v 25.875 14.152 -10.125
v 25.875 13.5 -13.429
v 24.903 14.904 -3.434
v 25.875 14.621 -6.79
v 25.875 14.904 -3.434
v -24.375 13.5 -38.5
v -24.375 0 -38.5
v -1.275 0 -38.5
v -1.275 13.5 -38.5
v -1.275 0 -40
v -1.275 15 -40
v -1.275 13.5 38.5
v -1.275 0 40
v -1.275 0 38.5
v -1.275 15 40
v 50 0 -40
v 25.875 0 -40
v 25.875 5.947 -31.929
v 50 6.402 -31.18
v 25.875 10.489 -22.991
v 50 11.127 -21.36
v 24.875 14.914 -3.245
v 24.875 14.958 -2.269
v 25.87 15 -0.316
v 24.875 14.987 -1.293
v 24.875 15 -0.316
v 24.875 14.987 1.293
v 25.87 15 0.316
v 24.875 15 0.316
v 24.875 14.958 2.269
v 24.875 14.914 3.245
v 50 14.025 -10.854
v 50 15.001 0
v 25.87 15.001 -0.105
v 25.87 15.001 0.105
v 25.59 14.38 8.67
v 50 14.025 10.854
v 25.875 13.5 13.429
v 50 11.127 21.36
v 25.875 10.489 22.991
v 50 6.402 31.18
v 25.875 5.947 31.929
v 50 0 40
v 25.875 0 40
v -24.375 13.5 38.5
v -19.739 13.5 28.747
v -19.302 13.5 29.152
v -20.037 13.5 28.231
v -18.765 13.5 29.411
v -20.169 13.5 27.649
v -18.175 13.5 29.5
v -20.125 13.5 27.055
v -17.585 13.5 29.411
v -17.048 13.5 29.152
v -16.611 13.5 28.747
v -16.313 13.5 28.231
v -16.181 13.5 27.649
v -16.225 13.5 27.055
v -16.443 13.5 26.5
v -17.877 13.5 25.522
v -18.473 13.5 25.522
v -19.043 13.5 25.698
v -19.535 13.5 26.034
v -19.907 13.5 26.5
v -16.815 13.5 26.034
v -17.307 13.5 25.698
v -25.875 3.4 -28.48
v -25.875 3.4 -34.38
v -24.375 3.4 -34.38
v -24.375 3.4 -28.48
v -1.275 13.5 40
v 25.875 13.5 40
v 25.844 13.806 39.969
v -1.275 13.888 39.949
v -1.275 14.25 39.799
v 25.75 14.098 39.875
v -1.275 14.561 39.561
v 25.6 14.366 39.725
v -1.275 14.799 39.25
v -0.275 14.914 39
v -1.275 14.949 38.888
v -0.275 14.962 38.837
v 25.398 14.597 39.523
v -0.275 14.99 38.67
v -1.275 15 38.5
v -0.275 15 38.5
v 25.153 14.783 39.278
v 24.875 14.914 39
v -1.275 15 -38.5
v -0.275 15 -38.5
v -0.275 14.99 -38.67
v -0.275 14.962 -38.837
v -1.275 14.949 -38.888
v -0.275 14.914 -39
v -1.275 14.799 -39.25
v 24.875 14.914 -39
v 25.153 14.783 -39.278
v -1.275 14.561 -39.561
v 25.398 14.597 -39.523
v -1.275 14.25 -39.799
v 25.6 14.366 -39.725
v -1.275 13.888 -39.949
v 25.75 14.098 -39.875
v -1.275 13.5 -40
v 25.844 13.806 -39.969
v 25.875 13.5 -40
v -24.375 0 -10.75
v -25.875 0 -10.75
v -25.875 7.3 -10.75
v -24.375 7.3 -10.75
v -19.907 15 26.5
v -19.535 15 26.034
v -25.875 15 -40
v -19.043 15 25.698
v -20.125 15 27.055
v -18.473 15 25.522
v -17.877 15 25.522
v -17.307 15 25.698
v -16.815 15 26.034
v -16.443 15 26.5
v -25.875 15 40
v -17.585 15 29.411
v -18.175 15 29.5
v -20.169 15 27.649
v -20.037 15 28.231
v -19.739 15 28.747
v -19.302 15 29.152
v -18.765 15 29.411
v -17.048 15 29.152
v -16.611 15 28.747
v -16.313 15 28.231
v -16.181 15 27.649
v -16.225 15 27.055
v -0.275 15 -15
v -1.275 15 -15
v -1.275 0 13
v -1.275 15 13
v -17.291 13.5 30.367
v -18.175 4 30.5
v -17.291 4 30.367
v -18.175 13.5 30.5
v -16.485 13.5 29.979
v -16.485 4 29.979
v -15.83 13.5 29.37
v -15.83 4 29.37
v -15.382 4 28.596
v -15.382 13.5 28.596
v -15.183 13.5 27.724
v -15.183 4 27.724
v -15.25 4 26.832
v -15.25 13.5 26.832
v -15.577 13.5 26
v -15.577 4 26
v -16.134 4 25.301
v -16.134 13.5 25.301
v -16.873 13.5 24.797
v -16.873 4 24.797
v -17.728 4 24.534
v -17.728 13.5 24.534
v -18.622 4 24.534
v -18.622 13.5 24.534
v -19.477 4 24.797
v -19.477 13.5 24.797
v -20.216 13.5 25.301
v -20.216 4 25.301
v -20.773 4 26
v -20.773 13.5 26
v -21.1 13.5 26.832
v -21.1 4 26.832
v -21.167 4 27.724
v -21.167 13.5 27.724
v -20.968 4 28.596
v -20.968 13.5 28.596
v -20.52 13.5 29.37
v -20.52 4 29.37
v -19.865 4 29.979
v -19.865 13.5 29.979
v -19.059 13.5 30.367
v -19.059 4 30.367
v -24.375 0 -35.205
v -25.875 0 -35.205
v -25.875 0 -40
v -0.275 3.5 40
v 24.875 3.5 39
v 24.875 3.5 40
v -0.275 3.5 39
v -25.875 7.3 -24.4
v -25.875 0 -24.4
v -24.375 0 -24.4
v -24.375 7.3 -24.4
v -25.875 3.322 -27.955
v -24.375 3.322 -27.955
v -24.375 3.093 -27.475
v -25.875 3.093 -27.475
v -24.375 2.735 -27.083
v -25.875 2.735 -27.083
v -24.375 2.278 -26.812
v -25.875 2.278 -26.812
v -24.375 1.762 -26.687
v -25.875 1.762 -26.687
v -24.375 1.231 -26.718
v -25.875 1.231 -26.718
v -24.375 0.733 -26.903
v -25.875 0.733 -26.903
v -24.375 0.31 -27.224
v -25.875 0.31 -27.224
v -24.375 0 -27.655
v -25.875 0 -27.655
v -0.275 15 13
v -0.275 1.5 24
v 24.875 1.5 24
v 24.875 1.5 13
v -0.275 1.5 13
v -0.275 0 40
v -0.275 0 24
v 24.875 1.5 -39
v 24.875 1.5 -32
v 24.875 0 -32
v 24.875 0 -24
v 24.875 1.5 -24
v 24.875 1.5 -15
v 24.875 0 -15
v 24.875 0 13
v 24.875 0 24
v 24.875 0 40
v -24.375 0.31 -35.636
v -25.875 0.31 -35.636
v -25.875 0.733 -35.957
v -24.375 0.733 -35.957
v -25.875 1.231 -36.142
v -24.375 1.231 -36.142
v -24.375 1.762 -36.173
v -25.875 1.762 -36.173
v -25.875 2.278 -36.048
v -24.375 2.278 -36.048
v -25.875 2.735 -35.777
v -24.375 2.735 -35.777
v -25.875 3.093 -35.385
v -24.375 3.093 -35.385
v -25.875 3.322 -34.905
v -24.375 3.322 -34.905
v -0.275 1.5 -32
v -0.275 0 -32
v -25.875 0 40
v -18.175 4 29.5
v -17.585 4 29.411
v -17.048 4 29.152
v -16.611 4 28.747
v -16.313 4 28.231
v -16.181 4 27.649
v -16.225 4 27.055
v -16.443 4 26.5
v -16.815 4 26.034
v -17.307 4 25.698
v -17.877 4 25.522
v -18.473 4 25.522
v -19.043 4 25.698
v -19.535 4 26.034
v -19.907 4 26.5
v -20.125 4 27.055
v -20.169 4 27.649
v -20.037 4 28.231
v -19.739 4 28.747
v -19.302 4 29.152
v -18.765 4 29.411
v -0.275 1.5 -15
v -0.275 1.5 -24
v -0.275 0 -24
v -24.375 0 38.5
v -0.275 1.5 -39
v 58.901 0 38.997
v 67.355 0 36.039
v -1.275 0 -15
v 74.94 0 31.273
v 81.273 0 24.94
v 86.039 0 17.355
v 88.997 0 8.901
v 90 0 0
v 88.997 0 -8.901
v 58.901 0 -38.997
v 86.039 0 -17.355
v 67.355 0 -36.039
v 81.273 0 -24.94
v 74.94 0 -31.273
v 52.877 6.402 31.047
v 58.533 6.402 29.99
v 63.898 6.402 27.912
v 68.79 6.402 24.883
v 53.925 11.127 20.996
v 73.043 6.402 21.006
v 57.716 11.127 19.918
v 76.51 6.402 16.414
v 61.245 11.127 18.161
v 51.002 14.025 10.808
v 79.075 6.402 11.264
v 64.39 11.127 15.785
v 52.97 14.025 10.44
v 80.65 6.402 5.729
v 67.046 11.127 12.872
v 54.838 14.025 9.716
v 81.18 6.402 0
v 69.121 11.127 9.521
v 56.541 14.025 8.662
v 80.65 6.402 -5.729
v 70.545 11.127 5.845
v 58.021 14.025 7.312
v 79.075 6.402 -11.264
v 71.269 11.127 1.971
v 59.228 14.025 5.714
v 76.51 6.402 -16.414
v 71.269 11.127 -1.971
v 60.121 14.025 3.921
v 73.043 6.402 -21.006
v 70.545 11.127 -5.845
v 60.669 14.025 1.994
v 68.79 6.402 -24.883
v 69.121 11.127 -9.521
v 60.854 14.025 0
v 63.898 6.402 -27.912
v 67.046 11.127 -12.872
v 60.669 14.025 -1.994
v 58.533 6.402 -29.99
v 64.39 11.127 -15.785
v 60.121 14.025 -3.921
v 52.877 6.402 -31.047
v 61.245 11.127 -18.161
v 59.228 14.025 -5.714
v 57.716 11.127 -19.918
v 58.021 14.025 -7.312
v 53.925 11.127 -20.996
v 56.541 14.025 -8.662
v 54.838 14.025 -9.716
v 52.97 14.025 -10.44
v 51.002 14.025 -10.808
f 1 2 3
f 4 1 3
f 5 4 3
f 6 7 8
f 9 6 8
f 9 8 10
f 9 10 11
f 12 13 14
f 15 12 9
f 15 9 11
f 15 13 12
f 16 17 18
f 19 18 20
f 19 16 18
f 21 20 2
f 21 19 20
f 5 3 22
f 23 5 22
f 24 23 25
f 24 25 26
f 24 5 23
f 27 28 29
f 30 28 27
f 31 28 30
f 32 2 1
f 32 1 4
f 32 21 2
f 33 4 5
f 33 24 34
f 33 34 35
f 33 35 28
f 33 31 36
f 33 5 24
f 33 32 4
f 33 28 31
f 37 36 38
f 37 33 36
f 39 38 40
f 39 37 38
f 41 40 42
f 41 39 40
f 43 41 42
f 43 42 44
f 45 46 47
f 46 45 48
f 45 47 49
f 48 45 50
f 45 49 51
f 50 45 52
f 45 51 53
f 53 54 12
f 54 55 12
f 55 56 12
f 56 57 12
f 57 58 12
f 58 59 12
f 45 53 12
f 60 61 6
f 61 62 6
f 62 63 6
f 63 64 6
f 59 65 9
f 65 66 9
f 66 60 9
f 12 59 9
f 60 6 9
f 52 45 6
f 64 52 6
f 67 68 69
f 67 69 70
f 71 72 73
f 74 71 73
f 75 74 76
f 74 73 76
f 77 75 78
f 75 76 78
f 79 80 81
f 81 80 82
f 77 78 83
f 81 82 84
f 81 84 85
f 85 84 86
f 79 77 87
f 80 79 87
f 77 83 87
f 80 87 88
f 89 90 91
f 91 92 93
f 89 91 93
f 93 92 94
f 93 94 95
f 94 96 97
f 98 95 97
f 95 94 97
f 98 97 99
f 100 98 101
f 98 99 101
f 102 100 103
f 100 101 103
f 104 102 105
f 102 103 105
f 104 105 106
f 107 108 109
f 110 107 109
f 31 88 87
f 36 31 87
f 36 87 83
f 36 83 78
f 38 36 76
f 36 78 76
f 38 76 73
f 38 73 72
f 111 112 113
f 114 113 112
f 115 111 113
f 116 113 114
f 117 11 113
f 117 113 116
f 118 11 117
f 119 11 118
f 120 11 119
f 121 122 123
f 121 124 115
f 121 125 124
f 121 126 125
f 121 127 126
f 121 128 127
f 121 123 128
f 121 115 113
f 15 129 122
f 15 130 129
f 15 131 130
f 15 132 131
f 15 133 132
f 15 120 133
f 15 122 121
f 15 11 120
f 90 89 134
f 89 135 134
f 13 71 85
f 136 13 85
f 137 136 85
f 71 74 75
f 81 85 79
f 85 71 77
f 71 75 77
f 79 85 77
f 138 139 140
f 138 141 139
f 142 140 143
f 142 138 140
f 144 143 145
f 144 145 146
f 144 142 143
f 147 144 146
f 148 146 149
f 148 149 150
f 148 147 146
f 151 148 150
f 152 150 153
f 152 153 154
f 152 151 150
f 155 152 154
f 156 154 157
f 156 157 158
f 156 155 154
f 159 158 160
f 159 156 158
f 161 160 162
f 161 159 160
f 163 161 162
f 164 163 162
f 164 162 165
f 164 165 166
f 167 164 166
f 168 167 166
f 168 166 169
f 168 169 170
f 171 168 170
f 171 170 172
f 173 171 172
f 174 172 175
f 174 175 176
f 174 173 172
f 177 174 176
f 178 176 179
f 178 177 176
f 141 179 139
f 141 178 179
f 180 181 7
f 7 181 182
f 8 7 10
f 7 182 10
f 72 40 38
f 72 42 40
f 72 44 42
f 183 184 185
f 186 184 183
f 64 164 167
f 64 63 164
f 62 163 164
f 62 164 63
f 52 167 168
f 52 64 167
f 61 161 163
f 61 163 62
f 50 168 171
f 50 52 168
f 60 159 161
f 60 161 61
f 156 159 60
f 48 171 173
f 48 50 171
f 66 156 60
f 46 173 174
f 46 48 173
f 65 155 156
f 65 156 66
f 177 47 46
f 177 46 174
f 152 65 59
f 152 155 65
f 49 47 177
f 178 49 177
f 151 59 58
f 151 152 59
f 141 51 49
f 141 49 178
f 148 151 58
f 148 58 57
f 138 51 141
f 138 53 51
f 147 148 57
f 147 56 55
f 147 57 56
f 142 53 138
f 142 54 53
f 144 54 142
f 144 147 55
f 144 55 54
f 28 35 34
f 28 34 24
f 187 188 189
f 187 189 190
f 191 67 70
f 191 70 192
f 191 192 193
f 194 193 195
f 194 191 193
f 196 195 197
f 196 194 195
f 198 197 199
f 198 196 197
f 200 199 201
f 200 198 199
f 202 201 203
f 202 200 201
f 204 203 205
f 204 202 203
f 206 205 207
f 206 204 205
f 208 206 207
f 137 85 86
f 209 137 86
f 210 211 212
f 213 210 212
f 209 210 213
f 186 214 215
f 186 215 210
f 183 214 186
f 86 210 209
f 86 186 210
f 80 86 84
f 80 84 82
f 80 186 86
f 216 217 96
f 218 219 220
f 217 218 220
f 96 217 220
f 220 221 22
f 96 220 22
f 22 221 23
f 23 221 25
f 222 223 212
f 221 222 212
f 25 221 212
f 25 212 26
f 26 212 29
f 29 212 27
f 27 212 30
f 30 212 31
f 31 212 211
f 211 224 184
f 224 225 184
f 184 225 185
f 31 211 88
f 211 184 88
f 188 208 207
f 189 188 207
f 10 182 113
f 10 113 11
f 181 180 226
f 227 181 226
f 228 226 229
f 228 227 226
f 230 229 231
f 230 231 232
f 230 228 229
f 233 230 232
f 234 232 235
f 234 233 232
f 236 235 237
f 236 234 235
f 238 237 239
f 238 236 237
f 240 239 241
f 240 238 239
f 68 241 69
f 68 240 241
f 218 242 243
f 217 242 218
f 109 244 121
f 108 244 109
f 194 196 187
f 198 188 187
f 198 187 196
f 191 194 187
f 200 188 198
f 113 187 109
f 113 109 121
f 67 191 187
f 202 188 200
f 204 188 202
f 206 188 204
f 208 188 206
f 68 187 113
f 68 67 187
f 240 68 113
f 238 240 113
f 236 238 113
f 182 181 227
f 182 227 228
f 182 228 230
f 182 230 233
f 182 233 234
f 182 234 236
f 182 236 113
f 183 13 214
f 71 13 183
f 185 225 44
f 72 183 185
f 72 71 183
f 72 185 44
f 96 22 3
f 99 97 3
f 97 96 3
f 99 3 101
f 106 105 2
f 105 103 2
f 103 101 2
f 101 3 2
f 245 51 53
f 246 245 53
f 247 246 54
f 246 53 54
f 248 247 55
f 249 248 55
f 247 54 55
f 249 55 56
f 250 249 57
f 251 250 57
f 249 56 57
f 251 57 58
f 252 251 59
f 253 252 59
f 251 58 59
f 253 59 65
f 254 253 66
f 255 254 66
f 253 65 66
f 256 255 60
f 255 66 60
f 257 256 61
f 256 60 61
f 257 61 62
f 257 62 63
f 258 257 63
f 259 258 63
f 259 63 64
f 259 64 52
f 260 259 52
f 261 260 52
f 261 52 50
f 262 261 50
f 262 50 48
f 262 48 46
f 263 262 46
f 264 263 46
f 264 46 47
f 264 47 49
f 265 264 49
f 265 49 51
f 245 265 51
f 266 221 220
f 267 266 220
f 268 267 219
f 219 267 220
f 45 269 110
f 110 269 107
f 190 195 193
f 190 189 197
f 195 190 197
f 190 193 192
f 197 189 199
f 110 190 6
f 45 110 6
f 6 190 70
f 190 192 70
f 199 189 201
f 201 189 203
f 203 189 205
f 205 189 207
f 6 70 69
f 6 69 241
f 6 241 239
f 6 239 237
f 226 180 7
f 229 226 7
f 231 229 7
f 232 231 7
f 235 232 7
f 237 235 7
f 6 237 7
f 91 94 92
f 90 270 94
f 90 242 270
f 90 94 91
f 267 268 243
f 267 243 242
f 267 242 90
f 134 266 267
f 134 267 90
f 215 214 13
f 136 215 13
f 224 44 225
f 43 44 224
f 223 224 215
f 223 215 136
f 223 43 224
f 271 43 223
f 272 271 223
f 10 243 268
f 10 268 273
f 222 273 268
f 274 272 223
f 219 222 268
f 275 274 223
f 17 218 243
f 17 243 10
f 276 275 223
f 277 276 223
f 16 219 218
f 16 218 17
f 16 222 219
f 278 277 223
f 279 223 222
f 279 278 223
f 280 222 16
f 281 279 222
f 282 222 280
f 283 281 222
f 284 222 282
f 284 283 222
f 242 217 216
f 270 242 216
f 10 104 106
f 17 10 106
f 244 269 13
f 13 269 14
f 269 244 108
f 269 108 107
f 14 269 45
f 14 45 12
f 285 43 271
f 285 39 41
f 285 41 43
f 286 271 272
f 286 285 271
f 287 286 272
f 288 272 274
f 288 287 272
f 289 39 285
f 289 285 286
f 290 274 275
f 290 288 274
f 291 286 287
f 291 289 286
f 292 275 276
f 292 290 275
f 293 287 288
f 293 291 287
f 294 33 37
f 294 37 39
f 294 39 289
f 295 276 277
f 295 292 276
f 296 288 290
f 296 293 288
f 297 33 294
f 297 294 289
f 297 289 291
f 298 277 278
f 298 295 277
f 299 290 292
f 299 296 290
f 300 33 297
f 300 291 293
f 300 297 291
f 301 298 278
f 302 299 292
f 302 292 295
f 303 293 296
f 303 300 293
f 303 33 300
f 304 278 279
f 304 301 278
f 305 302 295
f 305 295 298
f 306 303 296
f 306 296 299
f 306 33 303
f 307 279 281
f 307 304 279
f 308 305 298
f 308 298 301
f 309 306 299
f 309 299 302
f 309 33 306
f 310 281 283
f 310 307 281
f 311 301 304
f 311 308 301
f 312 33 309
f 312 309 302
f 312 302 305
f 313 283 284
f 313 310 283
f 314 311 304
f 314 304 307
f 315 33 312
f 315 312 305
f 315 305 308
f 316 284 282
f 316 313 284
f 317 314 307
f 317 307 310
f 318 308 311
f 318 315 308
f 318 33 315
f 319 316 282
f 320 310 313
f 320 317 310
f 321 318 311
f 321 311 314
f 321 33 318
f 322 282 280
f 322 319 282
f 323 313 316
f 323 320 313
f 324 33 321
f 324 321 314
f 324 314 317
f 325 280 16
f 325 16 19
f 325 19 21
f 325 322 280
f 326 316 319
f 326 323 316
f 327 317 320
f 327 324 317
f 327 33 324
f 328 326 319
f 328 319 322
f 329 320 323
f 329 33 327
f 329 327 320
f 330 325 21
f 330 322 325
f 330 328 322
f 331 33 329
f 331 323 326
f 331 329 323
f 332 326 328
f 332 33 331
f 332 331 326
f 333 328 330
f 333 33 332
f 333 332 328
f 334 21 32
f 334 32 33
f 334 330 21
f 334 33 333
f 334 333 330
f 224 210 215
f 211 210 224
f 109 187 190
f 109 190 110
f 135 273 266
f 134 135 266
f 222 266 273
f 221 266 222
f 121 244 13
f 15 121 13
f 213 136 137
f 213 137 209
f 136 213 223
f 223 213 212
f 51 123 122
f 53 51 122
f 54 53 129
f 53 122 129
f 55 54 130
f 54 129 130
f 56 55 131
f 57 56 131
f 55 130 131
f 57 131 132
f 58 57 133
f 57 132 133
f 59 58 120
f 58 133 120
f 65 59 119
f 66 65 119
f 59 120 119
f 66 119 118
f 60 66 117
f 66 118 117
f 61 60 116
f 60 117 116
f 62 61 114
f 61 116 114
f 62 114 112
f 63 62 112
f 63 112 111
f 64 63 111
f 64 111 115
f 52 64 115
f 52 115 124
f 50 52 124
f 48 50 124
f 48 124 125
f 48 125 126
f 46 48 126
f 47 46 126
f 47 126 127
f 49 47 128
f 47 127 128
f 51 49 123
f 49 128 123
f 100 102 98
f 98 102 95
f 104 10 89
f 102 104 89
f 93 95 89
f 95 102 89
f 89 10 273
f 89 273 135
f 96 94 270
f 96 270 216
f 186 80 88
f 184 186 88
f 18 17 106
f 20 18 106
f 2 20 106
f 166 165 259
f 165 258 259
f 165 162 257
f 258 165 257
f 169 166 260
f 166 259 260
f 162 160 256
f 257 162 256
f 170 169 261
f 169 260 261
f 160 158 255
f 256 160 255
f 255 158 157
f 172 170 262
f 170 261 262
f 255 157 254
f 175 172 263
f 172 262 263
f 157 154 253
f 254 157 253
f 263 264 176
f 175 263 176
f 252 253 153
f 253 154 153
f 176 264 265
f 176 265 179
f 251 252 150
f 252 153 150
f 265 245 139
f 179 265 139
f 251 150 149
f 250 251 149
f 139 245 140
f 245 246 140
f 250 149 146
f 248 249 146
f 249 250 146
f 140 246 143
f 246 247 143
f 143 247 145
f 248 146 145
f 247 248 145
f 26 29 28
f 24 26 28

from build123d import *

# Parameters (mm, degrees)
SKETCH1_W                  = 51.75
SKETCH1_H                  = 80
BOSS_EXTRUDE1_DEPTH        = 15
SHELL3_T                   = -1.5
CUT_EXTRUDE2_DEPTH         = 1.5
SKETCH6_W                  = 13.65
SKETCH6_H                  = 7.3
CUT_EXTRUDE3_DEPTH         = 1.5
SKETCH11_R                 = 2
BOSS_EXTRUDE10_DEPTH       = 11
SKETCH11_3_R               = 2
CUT_EXTRUDE10_DEPTH        = 1.5
SHELL9_T                   = 1
SKETCH47_W                 = 27.15
SKETCH47_H                 = 15
CUT_EXTRUDE15_DEPTH        = 86.407936546
SKETCH47_2_W               = 27.15
SKETCH47_2_H               = 15
BOSS_EXTRUDE12_DEPTH       = 80
SHELL15_T                  = -1
SHELL15_THICKNESS_2_FACE_W = 78
SHELL15_THICKNESS_2_FACE_H = 25.15
SHELL15_THICKNESS_2_DEPTH  = 0.5
SKETCH52_W                 = 25.15
SKETCH52_H                 = 3.5
CUT_EXTRUDE21_DEPTH        = 1
SKETCH54_W                 = 28
SKETCH54_H                 = 15
CUT_EXTRUDE22_DEPTH        = 1
SKETCH55_W                 = 25.15
SKETCH55_H                 = 15
SKETCH55_W_2               = 26.15
SKETCH55_H_2               = 28
SKETCH55_H_3               = 8
CUT_EXTRUDE23_DEPTH        = 1.5
BOSS_EXTRUDE13_DEPTH       = 24.13
REVOLVE5_ANGLE             = 180
FILLET1_R                  = 1.5


with BuildPart() as part:
    # Sketch1 → Boss-Extrude1 (new body)
    with BuildSketch(Plane(origin=(0, 0, 0), x_dir=(1, 0, 0), z_dir=(0, 1, 0))):
        Rectangle(SKETCH1_W, SKETCH1_H)
    extrude(amount=BOSS_EXTRUDE1_DEPTH)

    # Shell3
    shell3_openings = [part.faces().sort_by_distance(p)[0] for p in [
        (0, 0, 0),
    ]]
    offset(amount=SHELL3_T, openings=shell3_openings, kind=Kind.INTERSECTION)

    # Sketch4 → Cut-Extrude2 (cut)
    with BuildSketch(Plane.ZY.offset(25.875)):
        with BuildLine():
            Line((-34.38, 3.4), (-28.48, 3.4))
            ThreePointArc((-28.48, 3.4), (-26.68, 1.6), (-28.48, -0.2))
            Line((-28.48, -0.2), (-34.38, -0.2))
            ThreePointArc((-34.38, -0.2), (-36.18, 1.6), (-34.38, 3.4))
        make_face()
    extrude(amount=-CUT_EXTRUDE2_DEPTH, mode=Mode.SUBTRACT)

    # Sketch6 → Cut-Extrude3 (cut)
    with BuildSketch(Plane.ZY.offset(25.875)):
        with Locations((-17.575, 3.65)):
            Rectangle(SKETCH6_W, SKETCH6_H)
    extrude(amount=-CUT_EXTRUDE3_DEPTH, mode=Mode.SUBTRACT)

    # Sketch11 → Boss-Extrude10 (add)
    with BuildSketch(Plane(origin=(0, 15, 0), x_dir=(1, 0, 0), z_dir=(0, 1, 0))):
        with Locations(Location((-18.175, -27.5, 0), (0, 0, 270))):
            Circle(SKETCH11_R)
    extrude(amount=-BOSS_EXTRUDE10_DEPTH)

    # Sketch11<3> → Cut-Extrude10 (cut)
    with BuildSketch(Plane(origin=(0, 15, 0), x_dir=(1, 0, 0), z_dir=(0, 1, 0))):
        with Locations(Location((-18.175, -27.5, 0), (0, 0, 270))):
            Circle(SKETCH11_3_R)
    extrude(amount=-CUT_EXTRUDE10_DEPTH, mode=Mode.SUBTRACT)


with BuildPart() as cut_extrude10_piece_1:
    # of the separate pieces the step leaves, piece 1, a body of its own (cut_extrude10_pieces)
    add(part.part.solids().sort_by_distance((-25.875, 0, 40))[0])

    # Sketch47 → Cut-Extrude15 (cut, through all)
    with BuildSketch(Plane.XY.offset(40)):
        with Locations((12.3, 7.5)):
            Rectangle(SKETCH47_W, SKETCH47_H)
    extrude(amount=-CUT_EXTRUDE15_DEPTH, mode=Mode.SUBTRACT)


with BuildPart() as cut_extrude10_piece_2:
    # of the separate pieces the step leaves, piece 2, a body of its own (cut_extrude10_pieces)
    add(part.part.solids().sort_by_distance((-18.175, 4, 29.5))[0])

    # Shell9
    shell9_openings = [cut_extrude10_piece_2.faces().sort_by_distance(p)[0] for p in [
        (-18.175, 4, 27.5),
        (-18.175, 13.5, 27.5),
    ]]
    offset(amount=SHELL9_T, openings=shell9_openings, kind=Kind.INTERSECTION)


with BuildPart() as body_3:
    # Sketch47<2> → Boss-Extrude12 (new body)
    with BuildSketch(Plane.XY.offset(40)):
        with Locations((12.3, 7.5)):
            Rectangle(SKETCH47_2_W, SKETCH47_2_H)
    extrude(amount=-BOSS_EXTRUDE12_DEPTH)

    # Shell15
    shell15_openings = [body_3.faces().sort_by_distance(p)[0] for p in [
        (12.3, 15, 0),
    ]]
    offset(amount=SHELL15_T, openings=shell15_openings, kind=Kind.INTERSECTION)

    # Shell15 thickness 2 face (on inner face of the shell) → Shell15 thickness 2 (add)
    with BuildSketch(Plane(origin=(12.3, 1, 0), x_dir=(0, 0, -1), z_dir=(0, -1, 0))):
        Rectangle(SHELL15_THICKNESS_2_FACE_W, SHELL15_THICKNESS_2_FACE_H)
    extrude(amount=-SHELL15_THICKNESS_2_DEPTH)

    # Sketch52 → Cut-Extrude21 (cut)
    with BuildSketch(Plane(origin=(0, 0, 39), x_dir=(-1, 0, 0), z_dir=(0, 0, -1))):
        with Locations((-12.3, 1.75)):
            Rectangle(SKETCH52_W, SKETCH52_H)
    extrude(amount=-CUT_EXTRUDE21_DEPTH, mode=Mode.SUBTRACT)

    # Sketch54 → Cut-Extrude22 (cut)
    with BuildSketch(Plane(origin=(-0.275, 0, 0), x_dir=(0, 0, -1), z_dir=(1, 0, 0))):
        with Locations((1, 7.5)):
            Rectangle(SKETCH54_W, SKETCH54_H)
    extrude(amount=-CUT_EXTRUDE22_DEPTH, mode=Mode.SUBTRACT)

    # Sketch55 → Cut-Extrude23 (cut)
    with BuildSketch(Plane(origin=(0, 1.5, 0), x_dir=(1, 0, 0), z_dir=(0, 1, 0))):
        with Locations((12.3, -31.5)):
            Rectangle(SKETCH55_W, SKETCH55_H)
        with Locations((11.8, 1)):
            Rectangle(SKETCH55_W_2, SKETCH55_H_2)
        with Locations((12.3, 28)):
            Rectangle(SKETCH55_W, SKETCH55_H_3)
    extrude(amount=-CUT_EXTRUDE23_DEPTH, mode=Mode.SUBTRACT)

    # Sketch63 → Boss-Extrude13 (add)
    with BuildSketch(Plane(origin=(50, 0, 0), x_dir=(0, 0, -1), z_dir=(1, 0, 0))):
        with BuildLine():
            Line((-40, 0), (40, 0))
            ThreePointArc((40, 0), (0, 15.000821957), (-40, 0))
        make_face()
    extrude(amount=-BOSS_EXTRUDE13_DEPTH)

    # Sketch69 → Revolve5 (revolve)
    with BuildSketch(Plane(origin=(50, 0, 0), x_dir=(0, 0, -1), z_dir=(1, 0, 0))):
        with BuildLine():
            Line((0, 15.000821957), (0, 0))
            Line((0, 0), (-40, 0))
            ThreePointArc((-40, 0), (-21.360153671, 11.127288692), (0, 15.000821957))
        make_face()
    revolve(axis=Axis((50, 15.000821957, 0), (0, 1, 0)), revolution_arc=REVOLVE5_ANGLE)

    # Fillet1
    # the kernel refuses this fillet: 1.5 mm, written as the material it takes off along each edge
    with BuildSketch(Plane(origin=(25.875, 15, 43.75), x_dir=(0, -1, 0), z_dir=(0, 0, -1))) as fillet1_piece_1_section:
        with BuildLine():
            CenterArc((FILLET1_R, FILLET1_R), FILLET1_R, 180, 90)
            Line((0, FILLET1_R), (0, 0))
            Line((0, 0), (FILLET1_R, 0))
        make_face()
    fillet1_piece_1 = extrude(amount=47.183772234, mode=Mode.PRIVATE)
    fillet1_piece_1 = fillet1_piece_1 - Plane(origin=(25.872528752, -45.83, 0), x_dir=(0, 0.753400965585748, -0.6575613926124789), z_dir=(1, 0, 0)) * Cylinder(60.830821957, 101, mode=Mode.PRIVATE)
    add(fillet1_piece_1, mode=Mode.SUBTRACT)
    with BuildSketch(Plane(origin=(29.625, 15, -40), x_dir=(0, -1, 0), z_dir=(-1, 0, 0))) as fillet1_piece_2:
        with BuildLine():
            CenterArc((FILLET1_R, FILLET1_R), FILLET1_R, 180, 90)
            Line((0, FILLET1_R), (0, 0))
            Line((0, 0), (FILLET1_R, 0))
        make_face()
    extrude(amount=34.65, mode=Mode.SUBTRACT)
    with BuildSketch(Plane(origin=(29.625, 15, 40), x_dir=(0, -1, 0), z_dir=(-1, 0, 0))) as fillet1_piece_3:
        with BuildLine():
            CenterArc((FILLET1_R, -FILLET1_R), FILLET1_R, 90, 90)
            Line((0, -FILLET1_R), (0, 0))
            Line((0, 0), (FILLET1_R, 0))
        make_face()
    extrude(amount=34.65, mode=Mode.SUBTRACT)
    with BuildSketch(Plane(origin=(25.875, 15, 3.433772234), x_dir=(-1, 0, 0), z_dir=(0, 0, -1))) as fillet1_piece_4_section:
        with BuildLine():
            CenterArc((FILLET1_R, -FILLET1_R), FILLET1_R, 90, 90)
            Line((0, -FILLET1_R), (0, 0))
            Line((0, 0), (FILLET1_R, 0))
        make_face()
    fillet1_piece_4 = extrude(amount=47.183772234, mode=Mode.PRIVATE)
    fillet1_piece_4 = fillet1_piece_4 - Plane(origin=(25.372542367, -45.83, 0), x_dir=(0, 0.753400965585748, -0.6575613926124789), z_dir=(1, 0, 0)) * Cylinder(60.830821957, 101, mode=Mode.PRIVATE)
    add(fillet1_piece_4, mode=Mode.SUBTRACT)


solid = Compound([cut_extrude10_piece_1.part, cut_extrude10_piece_2.part, body_3.part])
